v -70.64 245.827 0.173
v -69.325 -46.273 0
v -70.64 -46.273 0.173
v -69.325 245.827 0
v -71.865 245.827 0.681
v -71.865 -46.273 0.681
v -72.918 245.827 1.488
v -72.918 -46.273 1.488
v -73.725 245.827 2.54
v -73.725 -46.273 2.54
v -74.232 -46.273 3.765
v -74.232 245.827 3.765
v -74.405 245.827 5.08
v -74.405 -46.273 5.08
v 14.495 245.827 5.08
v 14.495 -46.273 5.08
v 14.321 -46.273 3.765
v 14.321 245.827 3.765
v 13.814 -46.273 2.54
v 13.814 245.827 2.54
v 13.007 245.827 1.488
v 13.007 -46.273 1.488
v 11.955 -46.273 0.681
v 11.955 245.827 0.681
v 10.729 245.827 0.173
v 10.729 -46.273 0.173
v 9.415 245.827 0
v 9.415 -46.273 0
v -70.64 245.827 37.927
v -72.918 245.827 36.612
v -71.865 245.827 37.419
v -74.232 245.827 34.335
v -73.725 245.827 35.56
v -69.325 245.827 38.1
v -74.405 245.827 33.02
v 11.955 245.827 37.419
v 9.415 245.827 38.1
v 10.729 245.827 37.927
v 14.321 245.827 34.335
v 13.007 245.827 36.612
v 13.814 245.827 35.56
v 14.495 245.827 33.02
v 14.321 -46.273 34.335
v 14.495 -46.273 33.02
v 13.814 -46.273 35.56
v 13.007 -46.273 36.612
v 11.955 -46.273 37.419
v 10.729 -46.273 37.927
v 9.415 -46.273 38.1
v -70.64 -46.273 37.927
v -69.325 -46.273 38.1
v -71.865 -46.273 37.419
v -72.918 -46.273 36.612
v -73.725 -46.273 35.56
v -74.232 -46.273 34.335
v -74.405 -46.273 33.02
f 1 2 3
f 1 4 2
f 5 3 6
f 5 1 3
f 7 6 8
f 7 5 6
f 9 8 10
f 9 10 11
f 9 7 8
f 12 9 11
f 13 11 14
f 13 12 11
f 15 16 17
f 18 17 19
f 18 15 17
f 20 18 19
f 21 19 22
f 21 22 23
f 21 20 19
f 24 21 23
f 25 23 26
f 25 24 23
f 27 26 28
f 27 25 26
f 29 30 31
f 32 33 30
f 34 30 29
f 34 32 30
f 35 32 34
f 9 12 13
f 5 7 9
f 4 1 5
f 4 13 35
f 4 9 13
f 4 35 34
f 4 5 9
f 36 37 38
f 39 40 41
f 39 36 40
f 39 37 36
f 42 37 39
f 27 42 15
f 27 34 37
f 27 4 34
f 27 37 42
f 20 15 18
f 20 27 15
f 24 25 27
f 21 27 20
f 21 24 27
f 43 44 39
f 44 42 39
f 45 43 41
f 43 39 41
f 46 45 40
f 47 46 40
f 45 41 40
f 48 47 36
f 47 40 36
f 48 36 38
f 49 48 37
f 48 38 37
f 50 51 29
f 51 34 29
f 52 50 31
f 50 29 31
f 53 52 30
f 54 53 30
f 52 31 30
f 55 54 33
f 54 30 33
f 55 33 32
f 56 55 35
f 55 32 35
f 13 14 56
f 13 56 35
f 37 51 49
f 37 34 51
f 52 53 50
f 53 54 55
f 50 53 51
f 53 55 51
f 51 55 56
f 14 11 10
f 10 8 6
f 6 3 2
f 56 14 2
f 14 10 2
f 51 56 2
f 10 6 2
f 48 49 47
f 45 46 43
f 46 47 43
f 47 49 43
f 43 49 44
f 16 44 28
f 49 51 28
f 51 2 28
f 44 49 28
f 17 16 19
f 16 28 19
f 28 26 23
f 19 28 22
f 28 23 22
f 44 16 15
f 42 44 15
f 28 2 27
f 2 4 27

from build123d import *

# Parameters (mm, degrees)
F0_W     = 88.9
F0_H     = 292.1
F1_DEPTH = 38.1
F2_R     = 5.08
F3_R     = 5.08


with BuildPart() as f1:
    # F0 (on Top) → F1 (new body)
    with BuildSketch(Plane.XY):
        with Locations((-29.955483, 99.776556)):
            Rectangle(F0_W, F0_H)
    extrude(amount=F1_DEPTH)

    # F2
    f2_edges = [f1.edges().sort_by_distance(p)[0] for p in [
        (14.494517, 99.776556, 38.1),
    ]]
    fillet(f2_edges, radius=F2_R)

    # F3
    f3_edges = [f1.edges().sort_by_distance(p)[0] for p in [
        (-74.405483, 99.776556, 38.1),
        (14.494517, 99.776556, 0),
        (-74.405483, 99.776556, 0),
    ]]
    fillet(f3_edges, radius=F3_R)


solid = f1.part
